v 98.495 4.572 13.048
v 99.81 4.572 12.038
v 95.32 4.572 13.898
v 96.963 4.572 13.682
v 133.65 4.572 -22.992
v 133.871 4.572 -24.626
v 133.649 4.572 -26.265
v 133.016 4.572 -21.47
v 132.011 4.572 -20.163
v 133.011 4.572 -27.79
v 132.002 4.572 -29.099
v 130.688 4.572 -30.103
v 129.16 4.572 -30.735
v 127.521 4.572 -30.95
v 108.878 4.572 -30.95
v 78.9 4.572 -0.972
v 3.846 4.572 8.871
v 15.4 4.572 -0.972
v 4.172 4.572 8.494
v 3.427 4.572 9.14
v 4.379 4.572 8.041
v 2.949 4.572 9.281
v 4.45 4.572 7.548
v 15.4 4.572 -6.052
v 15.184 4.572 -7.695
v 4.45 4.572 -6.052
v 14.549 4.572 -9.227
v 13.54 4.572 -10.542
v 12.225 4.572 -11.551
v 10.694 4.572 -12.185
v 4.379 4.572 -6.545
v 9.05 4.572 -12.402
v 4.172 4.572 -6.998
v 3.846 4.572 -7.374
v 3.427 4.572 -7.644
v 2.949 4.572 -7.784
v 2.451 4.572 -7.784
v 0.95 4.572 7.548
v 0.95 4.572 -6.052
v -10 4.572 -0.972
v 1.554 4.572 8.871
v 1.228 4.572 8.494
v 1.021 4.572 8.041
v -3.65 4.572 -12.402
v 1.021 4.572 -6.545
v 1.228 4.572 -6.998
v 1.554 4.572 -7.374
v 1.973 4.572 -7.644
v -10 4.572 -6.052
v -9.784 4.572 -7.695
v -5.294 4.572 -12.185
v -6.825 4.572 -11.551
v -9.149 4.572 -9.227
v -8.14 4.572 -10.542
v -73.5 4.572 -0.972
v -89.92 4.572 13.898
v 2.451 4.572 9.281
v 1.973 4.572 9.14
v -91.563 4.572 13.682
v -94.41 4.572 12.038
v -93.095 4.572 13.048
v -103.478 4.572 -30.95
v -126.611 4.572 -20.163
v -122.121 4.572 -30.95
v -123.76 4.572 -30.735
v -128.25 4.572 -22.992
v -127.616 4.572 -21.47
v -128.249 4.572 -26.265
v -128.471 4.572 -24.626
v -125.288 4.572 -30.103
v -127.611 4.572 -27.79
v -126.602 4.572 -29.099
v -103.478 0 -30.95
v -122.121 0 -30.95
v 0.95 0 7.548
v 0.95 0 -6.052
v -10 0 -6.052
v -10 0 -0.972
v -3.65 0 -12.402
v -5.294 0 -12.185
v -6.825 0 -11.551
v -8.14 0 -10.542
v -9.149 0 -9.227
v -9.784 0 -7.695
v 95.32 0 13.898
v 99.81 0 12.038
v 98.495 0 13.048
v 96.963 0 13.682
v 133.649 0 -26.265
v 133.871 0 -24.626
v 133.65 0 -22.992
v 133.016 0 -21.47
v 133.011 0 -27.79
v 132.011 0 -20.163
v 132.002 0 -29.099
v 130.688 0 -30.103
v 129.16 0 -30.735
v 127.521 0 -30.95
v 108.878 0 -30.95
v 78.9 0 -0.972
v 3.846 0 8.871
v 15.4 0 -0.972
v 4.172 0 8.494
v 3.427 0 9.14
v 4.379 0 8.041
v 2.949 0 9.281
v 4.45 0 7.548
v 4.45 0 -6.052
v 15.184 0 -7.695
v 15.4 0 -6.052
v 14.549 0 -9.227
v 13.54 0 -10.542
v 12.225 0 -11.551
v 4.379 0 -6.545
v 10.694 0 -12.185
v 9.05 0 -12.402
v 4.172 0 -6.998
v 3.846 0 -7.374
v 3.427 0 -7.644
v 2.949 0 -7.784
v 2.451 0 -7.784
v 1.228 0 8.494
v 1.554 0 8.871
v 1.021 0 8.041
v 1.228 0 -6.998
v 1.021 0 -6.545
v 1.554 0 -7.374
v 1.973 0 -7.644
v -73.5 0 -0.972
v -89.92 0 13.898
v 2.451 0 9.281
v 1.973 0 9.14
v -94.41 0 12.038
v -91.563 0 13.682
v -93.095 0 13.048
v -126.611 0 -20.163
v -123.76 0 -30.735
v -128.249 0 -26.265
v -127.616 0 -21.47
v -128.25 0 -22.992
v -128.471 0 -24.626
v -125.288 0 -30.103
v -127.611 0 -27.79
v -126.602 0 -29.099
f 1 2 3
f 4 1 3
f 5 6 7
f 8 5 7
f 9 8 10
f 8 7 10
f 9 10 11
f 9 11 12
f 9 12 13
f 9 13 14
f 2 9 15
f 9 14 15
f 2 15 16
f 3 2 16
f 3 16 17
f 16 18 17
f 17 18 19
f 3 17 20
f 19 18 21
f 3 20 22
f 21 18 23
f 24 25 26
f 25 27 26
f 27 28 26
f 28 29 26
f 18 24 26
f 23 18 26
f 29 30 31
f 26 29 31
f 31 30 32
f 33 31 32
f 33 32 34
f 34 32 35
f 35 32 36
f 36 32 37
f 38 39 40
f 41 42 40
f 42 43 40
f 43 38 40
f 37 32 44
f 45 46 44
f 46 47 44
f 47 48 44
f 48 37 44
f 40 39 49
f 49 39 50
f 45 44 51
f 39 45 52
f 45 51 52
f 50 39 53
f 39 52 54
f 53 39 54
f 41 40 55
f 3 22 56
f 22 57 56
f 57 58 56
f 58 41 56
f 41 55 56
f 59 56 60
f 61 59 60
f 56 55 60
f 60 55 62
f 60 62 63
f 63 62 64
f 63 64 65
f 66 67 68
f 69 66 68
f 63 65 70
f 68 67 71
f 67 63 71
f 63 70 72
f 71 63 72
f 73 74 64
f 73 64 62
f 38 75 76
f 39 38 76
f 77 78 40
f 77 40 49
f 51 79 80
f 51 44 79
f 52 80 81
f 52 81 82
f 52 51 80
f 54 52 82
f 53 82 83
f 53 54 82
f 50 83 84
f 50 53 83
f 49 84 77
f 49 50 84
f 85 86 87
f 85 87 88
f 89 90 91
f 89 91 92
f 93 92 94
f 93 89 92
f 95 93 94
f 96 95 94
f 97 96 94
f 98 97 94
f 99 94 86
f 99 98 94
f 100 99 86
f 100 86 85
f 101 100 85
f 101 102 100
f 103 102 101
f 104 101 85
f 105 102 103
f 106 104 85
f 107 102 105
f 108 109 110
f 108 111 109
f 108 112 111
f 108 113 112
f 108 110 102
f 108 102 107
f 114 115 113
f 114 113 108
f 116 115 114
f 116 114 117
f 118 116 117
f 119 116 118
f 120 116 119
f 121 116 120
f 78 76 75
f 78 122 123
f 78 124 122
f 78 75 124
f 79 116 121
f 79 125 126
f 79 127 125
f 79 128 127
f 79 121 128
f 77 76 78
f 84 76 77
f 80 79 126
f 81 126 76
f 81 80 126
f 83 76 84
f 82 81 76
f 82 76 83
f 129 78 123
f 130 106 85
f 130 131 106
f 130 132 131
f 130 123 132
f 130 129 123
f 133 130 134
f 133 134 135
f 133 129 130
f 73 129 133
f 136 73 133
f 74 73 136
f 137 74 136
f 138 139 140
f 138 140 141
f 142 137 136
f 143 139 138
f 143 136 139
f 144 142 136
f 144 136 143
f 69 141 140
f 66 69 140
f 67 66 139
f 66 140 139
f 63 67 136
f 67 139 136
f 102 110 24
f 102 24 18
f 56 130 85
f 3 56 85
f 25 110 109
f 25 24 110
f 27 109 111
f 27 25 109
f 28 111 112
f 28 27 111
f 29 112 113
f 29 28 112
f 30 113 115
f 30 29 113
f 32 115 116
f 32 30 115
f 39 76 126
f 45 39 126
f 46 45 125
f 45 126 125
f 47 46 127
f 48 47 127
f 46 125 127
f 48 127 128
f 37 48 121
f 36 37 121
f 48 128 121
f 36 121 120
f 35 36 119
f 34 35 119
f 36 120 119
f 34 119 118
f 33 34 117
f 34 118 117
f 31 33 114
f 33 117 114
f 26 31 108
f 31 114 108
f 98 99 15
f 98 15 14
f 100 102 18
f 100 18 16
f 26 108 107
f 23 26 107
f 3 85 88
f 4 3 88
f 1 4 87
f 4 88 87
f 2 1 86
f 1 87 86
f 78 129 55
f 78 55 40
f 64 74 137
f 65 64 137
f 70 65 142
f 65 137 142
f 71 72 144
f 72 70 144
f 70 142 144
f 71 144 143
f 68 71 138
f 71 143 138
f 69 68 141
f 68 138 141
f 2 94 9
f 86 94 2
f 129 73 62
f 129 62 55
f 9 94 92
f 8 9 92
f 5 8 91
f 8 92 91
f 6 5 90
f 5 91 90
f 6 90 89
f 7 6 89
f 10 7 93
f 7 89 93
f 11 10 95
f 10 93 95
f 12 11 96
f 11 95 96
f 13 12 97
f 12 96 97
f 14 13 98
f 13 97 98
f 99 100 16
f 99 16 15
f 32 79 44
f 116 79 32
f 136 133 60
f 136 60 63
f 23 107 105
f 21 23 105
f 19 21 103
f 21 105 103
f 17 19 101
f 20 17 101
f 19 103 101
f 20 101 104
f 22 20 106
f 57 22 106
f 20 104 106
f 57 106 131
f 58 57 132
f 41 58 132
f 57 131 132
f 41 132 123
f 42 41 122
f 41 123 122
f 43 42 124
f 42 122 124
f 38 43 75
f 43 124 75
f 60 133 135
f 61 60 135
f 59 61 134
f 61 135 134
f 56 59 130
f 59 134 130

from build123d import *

# Parameters (mm, degrees)
BOSS_EXTRUDE1_DEPTH = 4.572
FILLET3_R           = 6.35
FILLET2_R           = 6.35


with BuildPart() as part:
    # Sketch1 → Boss-Extrude1 (new body)
    with BuildSketch(Plane(origin=(0, 0, 0), x_dir=(1, 0, 0), z_dir=(0, 1, 0))):
        Polygon((15.4, 12.401654114), (15.4, 0.971654114), (78.9, 0.971654114), (108.87813576, 30.949789874), (133.871024484, 30.949789874), (133.871024484, 22.022678598), (97.95, -13.898345886), (15.4, -13.898345886), (-10, -13.898345886), (-92.55, -13.898345886), (-128.471024484, 22.022678598), (-128.471024484, 30.949789874), (-103.47813576, 30.949789874), (-73.5, 0.971654114), (-10, 0.971654114), (-10, 12.401654114), align=None)
        with BuildLine():
            Line((0.95, -7.548345886), (0.95, 6.051654114))
            ThreePointArc((0.95, 6.051654114), (2.7, 7.801654114), (4.45, 6.051654114))
            Line((4.45, 6.051654114), (4.45, -7.548345886))
            ThreePointArc((4.45, -7.548345886), (2.7, -9.298345886), (0.95, -7.548345886))
        make_face(mode=Mode.SUBTRACT)
    extrude(amount=BOSS_EXTRUDE1_DEPTH)

    # Fillet3
    # the kernel refuses this fillet: 6.35 mm, written as the material it takes off along each edge
    with BuildSketch(Plane(origin=(133.871024484, -15.875, -30.949789874), x_dir=(0, 0, 1), z_dir=(0, 1, 0)), Plane(origin=(-128.471024484, -15.875, -30.949789874), x_dir=(1, 0, 0), z_dir=(0, 1, 0))) as fillet3_piece_1:
        with BuildLine():
            CenterArc((FILLET3_R, -FILLET3_R), FILLET3_R, 90, 90)
            Line((0, -FILLET3_R), (0, 0))
            Line((0, 0), (FILLET3_R, 0))
        make_face()
    extrude(amount=36.322, mode=Mode.SUBTRACT)
    with BuildSketch(Plane(origin=(-128.471024484, -6.575640303, -22.022678598), x_dir=(0, 0, -1), z_dir=(0, 1, 0)), Plane(origin=(133.871024484, -6.575640303, -22.022678598), x_dir=(-0.7071067811865476, 0, 0.7071067811865476), z_dir=(0, 1, 0)), Plane(origin=(97.95, -6.575640303, 13.898345886), x_dir=(-1, 0, 0), z_dir=(0, 1, 0)), Plane(origin=(-92.55, -6.575640303, 13.898345886), x_dir=(-0.7071067811865476, 0, -0.7071067811865476), z_dir=(0, 1, 0))) as fillet3_piece_2:
        with BuildLine():
            CenterArc((FILLET3_R * 0.414213562373, -FILLET3_R), FILLET3_R, 90, 45)
            Line((-FILLET3_R * 0.292893218813, -FILLET3_R * 0.292893218813), (0, 0))
            Line((0, 0), (FILLET3_R * 0.414213562373, 0))
        make_face()
    extrude(amount=17.723280605, mode=Mode.SUBTRACT)

    # Fillet2
    fillet2_edges = [part.edges().sort_by_distance(p)[0] for p in [
        (-10, 2.286, -12.401654114),
        (15.4, 2.286, -12.401654114),
    ]]
    fillet(fillet2_edges, radius=FILLET2_R)


solid = part.part
